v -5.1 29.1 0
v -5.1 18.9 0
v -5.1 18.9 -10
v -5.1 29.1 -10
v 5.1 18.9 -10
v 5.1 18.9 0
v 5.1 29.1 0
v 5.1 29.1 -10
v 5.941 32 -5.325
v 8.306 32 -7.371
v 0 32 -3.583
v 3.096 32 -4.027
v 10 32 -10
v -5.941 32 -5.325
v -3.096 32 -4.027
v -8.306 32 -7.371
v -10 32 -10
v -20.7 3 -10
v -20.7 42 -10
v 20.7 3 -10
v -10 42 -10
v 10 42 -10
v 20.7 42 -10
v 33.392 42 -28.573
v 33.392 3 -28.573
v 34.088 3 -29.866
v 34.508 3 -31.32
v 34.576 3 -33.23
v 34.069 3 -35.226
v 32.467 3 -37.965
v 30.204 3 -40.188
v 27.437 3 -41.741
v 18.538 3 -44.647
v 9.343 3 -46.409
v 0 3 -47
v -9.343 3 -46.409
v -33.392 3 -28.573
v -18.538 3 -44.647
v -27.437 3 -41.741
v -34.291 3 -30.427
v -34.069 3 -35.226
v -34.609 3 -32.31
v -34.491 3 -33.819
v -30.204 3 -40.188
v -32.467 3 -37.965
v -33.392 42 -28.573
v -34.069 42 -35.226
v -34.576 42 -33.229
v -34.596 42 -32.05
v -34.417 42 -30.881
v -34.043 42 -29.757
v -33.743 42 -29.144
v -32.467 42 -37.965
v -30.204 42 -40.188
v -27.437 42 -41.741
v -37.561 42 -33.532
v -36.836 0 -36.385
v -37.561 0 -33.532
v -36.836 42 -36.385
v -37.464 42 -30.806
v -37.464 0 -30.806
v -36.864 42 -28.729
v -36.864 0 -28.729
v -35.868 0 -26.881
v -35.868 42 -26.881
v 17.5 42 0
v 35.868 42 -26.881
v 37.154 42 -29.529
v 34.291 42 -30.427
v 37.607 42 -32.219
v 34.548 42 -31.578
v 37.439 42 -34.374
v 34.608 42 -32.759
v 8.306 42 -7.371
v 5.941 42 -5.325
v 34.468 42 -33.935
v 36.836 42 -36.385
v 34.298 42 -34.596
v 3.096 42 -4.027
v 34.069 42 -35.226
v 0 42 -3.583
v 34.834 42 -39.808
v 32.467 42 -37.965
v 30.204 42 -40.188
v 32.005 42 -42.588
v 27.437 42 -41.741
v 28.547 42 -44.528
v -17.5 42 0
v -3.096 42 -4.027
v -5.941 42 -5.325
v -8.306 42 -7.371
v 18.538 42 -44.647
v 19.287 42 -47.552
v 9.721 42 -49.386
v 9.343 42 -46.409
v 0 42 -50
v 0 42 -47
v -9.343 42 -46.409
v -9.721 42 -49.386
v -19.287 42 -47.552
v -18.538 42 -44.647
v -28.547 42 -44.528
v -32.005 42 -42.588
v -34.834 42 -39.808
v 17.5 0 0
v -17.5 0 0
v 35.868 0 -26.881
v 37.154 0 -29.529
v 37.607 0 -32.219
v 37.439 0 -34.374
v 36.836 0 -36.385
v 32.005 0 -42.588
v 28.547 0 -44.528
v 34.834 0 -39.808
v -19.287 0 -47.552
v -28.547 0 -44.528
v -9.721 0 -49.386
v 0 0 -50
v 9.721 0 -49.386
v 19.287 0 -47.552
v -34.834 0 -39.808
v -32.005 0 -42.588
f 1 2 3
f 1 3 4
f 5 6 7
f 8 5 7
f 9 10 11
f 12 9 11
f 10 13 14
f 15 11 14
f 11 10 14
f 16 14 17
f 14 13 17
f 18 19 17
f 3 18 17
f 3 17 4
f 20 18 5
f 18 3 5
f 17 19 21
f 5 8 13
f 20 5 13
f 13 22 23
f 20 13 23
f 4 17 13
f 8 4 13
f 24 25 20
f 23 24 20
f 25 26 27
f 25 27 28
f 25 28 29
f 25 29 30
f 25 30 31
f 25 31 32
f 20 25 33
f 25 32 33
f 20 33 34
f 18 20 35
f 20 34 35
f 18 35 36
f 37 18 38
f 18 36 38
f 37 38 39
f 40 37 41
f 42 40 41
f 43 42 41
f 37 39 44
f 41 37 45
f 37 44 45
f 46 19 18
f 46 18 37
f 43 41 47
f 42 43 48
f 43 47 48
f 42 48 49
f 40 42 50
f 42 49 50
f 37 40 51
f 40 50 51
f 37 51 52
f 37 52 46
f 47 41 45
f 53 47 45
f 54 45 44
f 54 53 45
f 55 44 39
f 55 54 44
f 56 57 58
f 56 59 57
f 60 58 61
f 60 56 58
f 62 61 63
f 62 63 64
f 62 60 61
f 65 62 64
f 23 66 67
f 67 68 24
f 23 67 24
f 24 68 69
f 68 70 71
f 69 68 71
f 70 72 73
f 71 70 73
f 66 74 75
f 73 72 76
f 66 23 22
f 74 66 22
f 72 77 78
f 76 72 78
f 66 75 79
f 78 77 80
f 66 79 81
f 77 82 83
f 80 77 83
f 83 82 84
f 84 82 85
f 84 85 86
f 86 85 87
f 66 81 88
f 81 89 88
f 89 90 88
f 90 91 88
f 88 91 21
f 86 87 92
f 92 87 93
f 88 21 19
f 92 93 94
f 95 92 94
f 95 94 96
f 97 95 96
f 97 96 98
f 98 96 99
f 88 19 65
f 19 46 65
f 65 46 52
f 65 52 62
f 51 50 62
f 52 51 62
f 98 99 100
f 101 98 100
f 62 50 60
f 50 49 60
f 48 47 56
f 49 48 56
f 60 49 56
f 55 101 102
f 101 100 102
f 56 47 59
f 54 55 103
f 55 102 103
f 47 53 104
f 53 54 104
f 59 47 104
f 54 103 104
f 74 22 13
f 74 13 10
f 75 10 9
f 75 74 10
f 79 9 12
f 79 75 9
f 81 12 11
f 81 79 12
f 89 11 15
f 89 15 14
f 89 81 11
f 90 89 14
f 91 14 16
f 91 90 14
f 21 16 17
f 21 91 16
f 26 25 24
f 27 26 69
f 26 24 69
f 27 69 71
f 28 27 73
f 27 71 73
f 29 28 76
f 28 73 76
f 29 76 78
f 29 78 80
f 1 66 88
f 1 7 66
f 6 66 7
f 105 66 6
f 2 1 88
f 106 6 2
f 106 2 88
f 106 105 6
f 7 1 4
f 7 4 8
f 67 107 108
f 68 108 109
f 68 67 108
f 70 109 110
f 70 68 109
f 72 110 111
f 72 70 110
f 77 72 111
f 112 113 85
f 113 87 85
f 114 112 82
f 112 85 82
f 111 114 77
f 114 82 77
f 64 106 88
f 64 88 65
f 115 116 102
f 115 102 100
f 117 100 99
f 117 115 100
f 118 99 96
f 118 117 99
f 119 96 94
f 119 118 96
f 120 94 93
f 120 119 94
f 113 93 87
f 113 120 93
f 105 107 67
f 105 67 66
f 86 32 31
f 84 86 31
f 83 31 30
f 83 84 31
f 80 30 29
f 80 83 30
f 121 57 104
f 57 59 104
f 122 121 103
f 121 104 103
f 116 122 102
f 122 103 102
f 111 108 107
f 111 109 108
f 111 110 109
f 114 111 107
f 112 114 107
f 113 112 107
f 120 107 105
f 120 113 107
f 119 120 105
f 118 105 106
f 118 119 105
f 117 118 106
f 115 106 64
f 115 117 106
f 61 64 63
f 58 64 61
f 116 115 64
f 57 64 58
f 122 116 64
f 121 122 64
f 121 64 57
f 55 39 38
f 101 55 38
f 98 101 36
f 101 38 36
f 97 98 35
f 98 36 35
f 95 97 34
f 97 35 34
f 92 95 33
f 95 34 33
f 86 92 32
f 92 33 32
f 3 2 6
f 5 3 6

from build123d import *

# Parameters (mm, degrees)
BOSS_EXTRUDE1_DEPTH = 42
FILLET3_R           = 15
FILLET4_R           = 10
SHELL1_T            = -3
BOSS_EXTRUDE2_DEPTH = 39
CUT_EXTRUDE1_REACH  = 77.357
SKETCH4_W           = 10.2
SKETCH4_H           = 10.2
CUT_EXTRUDE2_DEPTH  = 10


with BuildPart() as part:
    # Sketch1 → Boss-Extrude1 (new body)
    with BuildSketch(Plane(origin=(0, 0, 0), x_dir=(1, 0, 0), z_dir=(0, 1, 0))):
        with BuildLine():
            Line((17.5, 0), (-17.5, 0))
            Line((-17.5, 0), (-38, 30))
            Line((-38, 30), (-38, 40))
            ThreePointArc((-38, 40), (0, 50), (38, 40))
            Line((38, 40), (38, 30))
            Line((38, 30), (17.5, 0))
        make_face()
    extrude(amount=BOSS_EXTRUDE1_DEPTH)

    # Fillet3
    fillet3_edges = [part.edges().sort_by_distance(p)[0] for p in [
        (-38, 21, -40),
        (38, 21, -40),
    ]]
    fillet(fillet3_edges, radius=FILLET3_R)

    # Fillet4
    fillet4_edges = [part.edges().sort_by_distance(p)[0] for p in [
        (38, 21, -30),
        (-38, 21, -30),
    ]]
    fillet(fillet4_edges, radius=FILLET4_R)

    # Shell1
    shell1_openings = [part.faces().sort_by_distance(p)[0] for p in [
        (0, 42, -26.142046548),
    ]]
    offset(amount=SHELL1_T, openings=shell1_openings)

    # Sketch3 → Boss-Extrude2 (add)
    with BuildSketch(Plane(origin=(0, 42, 0), x_dir=(1, 0, 0), z_dir=(0, 1, 0))):
        Polygon((-20.699808874, 10), (20.699808874, 10), (15.91647554, 3), (-15.91647554, 3), align=None)
    extrude(amount=-BOSS_EXTRUDE2_DEPTH)

    # Sketch4 → Cut-Extrude1 (cut, up to next)
    with BuildSketch(Plane.XY, mode=Mode.PRIVATE) as cut_extrude1_sk1:
        with Locations((0, 24)):
            Rectangle(SKETCH4_W, SKETCH4_H)
    cut_extrude1_tool1 = extrude(cut_extrude1_sk1.sketch, amount=-CUT_EXTRUDE1_REACH, mode=Mode.PRIVATE) & part.part
    add(cut_extrude1_tool1.solids().sort_by_distance((0, 24, 0))[0], mode=Mode.SUBTRACT)

    # Sketch5 → Cut-Extrude2 (cut)
    with BuildSketch(Plane(origin=(0, 42, 0), x_dir=(1, 0, 0), z_dir=(0, 1, 0))):
        with BuildLine():
            Line((-10, 10), (10, 10))
            ThreePointArc((10, 10), (0, 3.582575695), (-10, 10))
        make_face()
    extrude(amount=-CUT_EXTRUDE2_DEPTH, mode=Mode.SUBTRACT)


solid = part.part
